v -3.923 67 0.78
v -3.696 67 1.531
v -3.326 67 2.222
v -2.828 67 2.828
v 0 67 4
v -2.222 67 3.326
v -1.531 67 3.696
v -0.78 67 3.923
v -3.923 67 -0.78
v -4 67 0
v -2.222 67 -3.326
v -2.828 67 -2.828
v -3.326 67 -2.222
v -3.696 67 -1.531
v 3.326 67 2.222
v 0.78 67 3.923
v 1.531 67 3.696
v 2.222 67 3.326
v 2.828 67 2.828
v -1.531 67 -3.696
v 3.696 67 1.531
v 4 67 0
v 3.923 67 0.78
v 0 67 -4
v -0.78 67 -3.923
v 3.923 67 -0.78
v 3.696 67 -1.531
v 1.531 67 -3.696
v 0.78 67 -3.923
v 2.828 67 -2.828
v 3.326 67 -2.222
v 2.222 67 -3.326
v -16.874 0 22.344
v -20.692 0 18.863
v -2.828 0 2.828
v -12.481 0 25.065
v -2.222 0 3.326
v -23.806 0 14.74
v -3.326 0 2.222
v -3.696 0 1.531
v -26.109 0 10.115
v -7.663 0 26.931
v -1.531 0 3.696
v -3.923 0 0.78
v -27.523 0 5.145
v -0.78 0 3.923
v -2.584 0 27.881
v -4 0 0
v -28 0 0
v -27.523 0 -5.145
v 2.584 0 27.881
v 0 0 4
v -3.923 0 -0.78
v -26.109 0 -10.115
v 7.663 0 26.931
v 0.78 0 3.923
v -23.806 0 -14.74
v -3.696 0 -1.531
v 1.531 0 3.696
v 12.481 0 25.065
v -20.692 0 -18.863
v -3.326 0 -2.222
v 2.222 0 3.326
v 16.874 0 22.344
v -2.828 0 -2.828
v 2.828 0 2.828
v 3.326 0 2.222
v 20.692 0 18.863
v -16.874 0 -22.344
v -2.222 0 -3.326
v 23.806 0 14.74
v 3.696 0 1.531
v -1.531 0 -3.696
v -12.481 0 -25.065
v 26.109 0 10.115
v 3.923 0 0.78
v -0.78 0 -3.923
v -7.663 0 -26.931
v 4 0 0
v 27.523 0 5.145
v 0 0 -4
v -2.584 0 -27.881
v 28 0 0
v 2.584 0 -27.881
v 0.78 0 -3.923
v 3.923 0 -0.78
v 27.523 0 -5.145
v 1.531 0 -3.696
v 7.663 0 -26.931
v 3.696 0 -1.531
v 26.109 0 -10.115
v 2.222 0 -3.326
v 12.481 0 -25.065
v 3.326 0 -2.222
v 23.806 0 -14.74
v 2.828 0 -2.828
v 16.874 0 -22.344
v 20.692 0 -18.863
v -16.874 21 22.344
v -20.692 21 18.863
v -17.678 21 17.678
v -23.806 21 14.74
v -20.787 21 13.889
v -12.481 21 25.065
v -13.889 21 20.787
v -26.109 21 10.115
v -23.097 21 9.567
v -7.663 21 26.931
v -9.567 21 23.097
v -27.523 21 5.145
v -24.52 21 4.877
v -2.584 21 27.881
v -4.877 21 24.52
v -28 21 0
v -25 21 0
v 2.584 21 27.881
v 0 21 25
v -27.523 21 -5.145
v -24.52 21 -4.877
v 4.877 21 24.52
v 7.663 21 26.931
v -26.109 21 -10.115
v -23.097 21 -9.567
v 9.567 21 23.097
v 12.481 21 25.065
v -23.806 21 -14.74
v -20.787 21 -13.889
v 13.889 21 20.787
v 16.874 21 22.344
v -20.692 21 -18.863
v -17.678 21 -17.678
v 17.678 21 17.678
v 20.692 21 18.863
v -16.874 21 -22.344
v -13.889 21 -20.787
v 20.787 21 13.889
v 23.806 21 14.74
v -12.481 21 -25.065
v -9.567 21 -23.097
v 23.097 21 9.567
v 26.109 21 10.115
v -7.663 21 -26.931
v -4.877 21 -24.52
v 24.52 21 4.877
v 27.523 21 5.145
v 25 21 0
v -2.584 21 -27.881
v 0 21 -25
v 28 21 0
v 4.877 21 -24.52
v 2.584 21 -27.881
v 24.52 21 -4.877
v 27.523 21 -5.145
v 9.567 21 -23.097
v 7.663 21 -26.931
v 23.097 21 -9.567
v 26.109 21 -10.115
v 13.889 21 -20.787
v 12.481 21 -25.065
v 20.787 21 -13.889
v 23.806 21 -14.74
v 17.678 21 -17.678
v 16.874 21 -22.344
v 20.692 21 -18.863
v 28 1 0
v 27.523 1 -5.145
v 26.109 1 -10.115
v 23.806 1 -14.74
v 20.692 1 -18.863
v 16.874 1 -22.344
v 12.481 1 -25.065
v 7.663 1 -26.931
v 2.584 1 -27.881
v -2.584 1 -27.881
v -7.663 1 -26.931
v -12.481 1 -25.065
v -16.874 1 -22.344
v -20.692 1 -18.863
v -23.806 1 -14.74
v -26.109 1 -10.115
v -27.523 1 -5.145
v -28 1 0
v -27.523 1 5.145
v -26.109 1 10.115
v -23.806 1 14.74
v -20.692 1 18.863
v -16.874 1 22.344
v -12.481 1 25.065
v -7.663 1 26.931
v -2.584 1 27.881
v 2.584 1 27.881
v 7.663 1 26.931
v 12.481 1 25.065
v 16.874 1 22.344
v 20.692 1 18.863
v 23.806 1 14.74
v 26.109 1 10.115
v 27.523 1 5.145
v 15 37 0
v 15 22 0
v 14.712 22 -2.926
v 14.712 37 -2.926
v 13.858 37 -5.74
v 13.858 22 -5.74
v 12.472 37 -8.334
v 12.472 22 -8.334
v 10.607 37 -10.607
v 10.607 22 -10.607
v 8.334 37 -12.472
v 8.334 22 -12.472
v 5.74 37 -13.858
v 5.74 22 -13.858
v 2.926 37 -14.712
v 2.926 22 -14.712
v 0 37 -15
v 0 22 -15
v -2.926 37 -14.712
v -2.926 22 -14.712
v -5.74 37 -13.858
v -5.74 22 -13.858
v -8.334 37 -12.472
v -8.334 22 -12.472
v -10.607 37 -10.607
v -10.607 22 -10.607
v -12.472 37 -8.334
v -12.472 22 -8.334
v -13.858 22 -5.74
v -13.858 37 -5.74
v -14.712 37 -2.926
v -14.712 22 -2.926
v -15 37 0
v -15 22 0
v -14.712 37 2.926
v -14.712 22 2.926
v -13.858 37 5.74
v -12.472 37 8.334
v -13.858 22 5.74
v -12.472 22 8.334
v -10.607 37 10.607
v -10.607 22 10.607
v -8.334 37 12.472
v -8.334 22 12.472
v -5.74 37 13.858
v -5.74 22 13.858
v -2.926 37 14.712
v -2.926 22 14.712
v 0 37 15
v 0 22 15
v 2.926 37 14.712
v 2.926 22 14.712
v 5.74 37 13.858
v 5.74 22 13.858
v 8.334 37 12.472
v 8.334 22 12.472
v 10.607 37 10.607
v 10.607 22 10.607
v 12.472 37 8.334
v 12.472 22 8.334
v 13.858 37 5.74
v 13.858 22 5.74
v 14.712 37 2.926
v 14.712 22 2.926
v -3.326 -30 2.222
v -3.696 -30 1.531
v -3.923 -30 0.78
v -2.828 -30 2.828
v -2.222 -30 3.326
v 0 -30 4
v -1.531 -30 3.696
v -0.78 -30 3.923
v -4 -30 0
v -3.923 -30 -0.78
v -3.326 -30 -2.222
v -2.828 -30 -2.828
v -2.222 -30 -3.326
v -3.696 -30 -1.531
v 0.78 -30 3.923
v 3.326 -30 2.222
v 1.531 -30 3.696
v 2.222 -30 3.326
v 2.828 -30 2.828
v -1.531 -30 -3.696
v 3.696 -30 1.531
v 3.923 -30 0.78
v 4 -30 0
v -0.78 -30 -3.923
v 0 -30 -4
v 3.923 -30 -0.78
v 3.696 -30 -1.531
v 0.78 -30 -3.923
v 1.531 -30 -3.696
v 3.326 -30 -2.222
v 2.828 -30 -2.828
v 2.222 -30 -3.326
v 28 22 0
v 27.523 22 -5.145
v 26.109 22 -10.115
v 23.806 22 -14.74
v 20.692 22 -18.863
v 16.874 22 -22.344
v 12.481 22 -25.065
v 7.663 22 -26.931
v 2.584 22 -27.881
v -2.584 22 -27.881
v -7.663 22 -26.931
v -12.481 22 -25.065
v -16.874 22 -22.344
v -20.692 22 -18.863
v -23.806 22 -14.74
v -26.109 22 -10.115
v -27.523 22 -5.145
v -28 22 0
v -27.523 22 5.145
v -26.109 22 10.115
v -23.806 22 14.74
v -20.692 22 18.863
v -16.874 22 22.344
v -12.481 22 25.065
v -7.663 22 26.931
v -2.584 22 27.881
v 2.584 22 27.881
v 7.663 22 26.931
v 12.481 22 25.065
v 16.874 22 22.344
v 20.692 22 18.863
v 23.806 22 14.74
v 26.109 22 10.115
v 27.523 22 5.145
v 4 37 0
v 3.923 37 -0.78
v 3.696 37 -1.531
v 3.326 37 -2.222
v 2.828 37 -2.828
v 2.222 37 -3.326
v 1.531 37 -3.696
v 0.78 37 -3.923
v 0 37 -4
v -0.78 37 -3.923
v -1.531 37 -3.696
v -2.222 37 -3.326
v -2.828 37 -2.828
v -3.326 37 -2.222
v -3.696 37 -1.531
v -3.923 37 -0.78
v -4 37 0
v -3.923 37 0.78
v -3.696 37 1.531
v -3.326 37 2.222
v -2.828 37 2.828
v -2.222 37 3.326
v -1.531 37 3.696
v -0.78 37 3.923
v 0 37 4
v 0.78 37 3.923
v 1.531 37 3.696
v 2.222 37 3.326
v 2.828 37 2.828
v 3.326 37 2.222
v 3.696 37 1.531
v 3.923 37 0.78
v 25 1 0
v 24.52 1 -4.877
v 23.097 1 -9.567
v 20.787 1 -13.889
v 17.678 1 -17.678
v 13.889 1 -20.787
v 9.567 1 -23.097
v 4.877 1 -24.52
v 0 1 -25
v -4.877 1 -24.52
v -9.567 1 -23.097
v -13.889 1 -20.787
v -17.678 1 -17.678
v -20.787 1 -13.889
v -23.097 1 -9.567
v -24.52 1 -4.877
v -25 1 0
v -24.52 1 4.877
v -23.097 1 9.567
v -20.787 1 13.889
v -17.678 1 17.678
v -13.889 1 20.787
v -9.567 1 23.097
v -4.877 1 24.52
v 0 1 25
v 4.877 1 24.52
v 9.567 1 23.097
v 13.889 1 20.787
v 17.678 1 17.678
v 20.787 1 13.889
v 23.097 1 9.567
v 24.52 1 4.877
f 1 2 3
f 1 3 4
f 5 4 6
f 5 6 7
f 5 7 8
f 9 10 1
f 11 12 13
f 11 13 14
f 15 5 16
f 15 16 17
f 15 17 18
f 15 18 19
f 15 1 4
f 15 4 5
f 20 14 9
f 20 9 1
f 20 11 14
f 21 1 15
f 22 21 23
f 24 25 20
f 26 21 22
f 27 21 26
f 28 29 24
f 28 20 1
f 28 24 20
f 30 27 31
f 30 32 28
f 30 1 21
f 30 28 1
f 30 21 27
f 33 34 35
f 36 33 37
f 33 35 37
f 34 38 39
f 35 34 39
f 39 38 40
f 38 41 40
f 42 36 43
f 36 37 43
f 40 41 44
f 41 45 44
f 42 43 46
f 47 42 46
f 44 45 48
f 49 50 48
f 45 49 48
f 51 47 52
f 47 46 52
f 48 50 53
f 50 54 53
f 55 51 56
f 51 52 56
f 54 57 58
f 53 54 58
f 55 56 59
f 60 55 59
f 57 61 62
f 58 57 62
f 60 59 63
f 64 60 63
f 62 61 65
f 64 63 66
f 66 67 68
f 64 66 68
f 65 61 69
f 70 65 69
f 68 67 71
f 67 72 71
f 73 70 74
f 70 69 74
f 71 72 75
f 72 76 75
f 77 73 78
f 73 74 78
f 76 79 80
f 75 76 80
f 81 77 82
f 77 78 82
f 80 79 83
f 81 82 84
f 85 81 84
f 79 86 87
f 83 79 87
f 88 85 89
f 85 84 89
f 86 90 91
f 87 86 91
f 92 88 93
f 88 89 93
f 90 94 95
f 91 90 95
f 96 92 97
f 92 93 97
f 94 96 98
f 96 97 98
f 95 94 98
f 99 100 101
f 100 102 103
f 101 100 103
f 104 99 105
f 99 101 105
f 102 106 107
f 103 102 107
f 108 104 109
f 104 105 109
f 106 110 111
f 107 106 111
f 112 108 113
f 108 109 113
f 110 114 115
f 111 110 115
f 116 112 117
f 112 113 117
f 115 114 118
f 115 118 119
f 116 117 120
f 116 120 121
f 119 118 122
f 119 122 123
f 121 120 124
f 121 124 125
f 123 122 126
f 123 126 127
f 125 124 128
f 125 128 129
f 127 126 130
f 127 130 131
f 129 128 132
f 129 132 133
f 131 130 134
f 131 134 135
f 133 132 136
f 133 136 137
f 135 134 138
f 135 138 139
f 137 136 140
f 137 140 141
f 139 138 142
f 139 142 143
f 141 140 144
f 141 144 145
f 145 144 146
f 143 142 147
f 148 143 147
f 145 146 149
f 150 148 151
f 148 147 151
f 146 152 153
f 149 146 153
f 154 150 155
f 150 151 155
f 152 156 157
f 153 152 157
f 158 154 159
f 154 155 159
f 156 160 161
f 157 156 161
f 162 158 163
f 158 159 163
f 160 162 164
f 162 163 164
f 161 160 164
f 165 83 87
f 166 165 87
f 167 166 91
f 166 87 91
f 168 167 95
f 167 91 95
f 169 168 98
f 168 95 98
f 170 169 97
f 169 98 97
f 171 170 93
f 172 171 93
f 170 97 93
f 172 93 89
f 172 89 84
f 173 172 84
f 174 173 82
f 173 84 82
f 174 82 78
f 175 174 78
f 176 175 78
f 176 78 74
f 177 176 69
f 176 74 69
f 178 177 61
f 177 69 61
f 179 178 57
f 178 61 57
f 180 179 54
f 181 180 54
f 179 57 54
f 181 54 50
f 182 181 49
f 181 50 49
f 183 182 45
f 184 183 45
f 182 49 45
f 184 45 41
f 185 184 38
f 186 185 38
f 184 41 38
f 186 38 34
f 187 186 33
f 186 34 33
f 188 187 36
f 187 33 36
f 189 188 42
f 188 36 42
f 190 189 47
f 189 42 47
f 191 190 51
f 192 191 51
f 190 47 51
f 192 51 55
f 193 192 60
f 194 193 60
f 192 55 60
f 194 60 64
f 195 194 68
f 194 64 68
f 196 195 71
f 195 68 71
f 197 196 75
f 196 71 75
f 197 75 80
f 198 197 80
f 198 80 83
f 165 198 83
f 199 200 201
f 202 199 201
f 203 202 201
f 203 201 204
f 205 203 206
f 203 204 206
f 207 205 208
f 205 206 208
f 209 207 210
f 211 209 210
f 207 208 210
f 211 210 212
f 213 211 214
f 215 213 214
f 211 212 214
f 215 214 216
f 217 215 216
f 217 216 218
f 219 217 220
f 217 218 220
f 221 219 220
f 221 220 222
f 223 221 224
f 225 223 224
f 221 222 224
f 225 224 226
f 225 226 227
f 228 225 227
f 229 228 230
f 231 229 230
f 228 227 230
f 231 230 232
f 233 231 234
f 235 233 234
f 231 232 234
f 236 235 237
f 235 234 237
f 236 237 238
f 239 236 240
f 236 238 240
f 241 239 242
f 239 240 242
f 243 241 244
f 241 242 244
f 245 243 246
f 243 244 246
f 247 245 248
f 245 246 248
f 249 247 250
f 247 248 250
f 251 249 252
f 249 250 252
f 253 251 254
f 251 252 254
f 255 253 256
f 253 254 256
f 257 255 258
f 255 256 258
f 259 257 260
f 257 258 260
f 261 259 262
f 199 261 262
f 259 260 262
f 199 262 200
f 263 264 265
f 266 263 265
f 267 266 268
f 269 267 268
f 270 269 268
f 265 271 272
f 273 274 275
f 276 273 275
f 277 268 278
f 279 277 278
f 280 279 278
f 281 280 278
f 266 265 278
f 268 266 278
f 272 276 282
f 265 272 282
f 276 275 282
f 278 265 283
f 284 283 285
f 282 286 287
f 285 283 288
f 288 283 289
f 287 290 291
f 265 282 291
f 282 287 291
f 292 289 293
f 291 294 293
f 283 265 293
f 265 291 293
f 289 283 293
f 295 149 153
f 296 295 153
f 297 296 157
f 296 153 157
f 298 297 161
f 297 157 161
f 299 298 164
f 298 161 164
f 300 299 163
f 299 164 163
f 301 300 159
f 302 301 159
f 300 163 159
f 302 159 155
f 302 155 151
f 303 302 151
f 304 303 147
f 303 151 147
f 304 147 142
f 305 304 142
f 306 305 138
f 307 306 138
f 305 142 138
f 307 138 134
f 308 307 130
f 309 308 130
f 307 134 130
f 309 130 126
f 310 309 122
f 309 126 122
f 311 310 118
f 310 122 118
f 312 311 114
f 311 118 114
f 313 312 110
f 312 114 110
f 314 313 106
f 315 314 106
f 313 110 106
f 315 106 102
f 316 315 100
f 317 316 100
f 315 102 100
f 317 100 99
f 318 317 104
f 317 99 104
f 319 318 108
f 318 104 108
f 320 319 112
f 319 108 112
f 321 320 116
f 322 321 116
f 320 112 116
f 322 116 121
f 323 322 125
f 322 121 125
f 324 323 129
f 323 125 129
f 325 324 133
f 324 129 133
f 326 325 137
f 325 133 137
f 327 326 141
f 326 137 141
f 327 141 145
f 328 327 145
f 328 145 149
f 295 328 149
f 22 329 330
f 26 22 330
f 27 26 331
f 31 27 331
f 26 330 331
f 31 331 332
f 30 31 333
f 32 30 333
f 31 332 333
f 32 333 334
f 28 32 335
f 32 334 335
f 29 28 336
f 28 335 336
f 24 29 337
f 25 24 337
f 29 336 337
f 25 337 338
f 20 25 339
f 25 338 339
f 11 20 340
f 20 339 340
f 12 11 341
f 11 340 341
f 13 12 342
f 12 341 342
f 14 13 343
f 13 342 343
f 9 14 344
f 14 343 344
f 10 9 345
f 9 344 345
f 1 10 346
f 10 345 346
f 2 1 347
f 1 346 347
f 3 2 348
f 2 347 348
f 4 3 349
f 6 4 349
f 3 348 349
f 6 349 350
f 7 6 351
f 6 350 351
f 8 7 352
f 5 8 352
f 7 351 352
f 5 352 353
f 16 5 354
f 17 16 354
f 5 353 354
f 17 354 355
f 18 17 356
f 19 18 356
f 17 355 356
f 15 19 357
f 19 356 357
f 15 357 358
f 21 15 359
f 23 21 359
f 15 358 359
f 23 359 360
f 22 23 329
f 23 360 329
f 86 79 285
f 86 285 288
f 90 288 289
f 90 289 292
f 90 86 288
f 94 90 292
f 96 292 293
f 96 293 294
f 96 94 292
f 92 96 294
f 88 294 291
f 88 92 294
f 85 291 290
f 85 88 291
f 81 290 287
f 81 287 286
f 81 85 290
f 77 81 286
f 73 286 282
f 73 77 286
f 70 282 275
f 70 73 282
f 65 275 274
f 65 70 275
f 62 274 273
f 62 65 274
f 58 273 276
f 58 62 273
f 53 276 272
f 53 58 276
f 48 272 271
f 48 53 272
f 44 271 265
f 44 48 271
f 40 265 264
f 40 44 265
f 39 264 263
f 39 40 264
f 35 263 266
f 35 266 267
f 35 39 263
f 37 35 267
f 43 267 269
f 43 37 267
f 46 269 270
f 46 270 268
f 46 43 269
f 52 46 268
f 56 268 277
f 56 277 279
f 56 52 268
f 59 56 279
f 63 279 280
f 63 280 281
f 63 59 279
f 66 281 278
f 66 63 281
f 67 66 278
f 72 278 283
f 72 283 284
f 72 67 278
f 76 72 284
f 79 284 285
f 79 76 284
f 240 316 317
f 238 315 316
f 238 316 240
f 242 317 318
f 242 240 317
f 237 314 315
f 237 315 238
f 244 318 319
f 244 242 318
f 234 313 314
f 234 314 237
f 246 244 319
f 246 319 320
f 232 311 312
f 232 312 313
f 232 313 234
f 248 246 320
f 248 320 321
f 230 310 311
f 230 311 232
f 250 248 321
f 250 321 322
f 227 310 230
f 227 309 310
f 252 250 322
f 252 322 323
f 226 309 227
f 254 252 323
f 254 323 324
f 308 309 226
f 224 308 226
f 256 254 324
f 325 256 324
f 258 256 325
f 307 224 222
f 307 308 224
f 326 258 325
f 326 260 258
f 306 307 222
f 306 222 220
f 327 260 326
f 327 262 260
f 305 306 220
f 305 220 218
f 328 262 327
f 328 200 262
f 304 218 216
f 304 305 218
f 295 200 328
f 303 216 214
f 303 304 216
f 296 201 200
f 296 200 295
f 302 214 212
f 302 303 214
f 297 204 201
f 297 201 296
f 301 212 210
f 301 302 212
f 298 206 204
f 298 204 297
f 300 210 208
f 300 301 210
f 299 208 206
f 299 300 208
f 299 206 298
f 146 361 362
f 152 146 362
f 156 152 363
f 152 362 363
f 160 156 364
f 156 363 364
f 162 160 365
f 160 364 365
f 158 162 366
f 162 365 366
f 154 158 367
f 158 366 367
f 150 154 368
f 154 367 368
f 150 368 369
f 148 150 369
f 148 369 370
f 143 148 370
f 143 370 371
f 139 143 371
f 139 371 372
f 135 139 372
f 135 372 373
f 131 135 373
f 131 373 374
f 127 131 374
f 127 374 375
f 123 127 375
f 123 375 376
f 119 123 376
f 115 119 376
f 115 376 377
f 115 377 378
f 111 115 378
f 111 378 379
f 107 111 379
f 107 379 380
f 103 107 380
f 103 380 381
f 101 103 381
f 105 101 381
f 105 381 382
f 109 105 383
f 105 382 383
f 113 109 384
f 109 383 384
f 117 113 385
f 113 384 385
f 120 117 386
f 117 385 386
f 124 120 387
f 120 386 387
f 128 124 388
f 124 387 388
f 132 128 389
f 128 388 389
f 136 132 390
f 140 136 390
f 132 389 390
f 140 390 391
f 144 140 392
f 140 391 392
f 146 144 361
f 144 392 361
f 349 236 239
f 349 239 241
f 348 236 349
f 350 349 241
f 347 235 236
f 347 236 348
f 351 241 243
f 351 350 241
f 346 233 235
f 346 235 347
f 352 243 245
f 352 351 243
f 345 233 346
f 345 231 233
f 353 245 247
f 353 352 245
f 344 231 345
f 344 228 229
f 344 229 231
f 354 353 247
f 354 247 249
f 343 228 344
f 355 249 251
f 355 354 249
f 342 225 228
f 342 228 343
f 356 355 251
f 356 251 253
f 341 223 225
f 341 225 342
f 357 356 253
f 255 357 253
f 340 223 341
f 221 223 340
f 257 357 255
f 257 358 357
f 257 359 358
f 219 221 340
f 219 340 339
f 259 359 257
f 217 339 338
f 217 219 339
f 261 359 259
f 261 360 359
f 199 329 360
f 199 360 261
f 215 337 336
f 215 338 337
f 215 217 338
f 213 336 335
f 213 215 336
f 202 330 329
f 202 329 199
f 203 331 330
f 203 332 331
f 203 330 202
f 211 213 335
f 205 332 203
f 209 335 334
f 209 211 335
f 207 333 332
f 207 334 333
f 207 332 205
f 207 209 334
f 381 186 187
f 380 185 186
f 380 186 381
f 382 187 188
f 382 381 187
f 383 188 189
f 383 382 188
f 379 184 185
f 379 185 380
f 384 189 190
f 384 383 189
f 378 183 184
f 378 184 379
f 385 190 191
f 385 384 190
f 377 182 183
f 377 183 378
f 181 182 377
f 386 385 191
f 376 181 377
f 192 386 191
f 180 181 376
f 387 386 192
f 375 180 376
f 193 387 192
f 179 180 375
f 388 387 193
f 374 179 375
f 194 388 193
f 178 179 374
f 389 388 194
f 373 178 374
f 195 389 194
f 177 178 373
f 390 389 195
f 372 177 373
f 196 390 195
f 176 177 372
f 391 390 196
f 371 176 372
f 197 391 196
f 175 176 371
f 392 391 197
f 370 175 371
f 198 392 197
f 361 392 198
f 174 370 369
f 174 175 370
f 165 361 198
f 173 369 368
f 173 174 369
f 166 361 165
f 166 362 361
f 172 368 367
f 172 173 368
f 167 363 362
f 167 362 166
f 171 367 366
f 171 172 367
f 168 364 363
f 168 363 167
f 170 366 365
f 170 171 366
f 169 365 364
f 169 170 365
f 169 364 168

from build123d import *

# Parameters (mm, degrees)
SKETCH1_R           = 25
BOSS_EXTRUDE1_DEPTH = 21
SKETCH2_R           = 28
BOSS_EXTRUDE2_DEPTH = 1
SKETCH3_R           = 28
BOSS_EXTRUDE3_DEPTH = 1
SKETCH4_R           = 15
BOSS_EXTRUDE4_DEPTH = 15
SKETCH5_R           = 4
BOSS_EXTRUDE5_DEPTH = 30
SKETCH6_R           = 4
BOSS_EXTRUDE6_DEPTH = 30


with BuildPart() as part:
    # Sketch1 → Boss-Extrude1 (new body)
    with BuildSketch(Plane(origin=(0, 0, 0), x_dir=(1, 0, 0), z_dir=(0, 1, 0))):
        Circle(SKETCH1_R)
    extrude(amount=BOSS_EXTRUDE1_DEPTH)

    # Sketch2 → Boss-Extrude2 (add)
    with BuildSketch(Plane(origin=(0, 0, 0), x_dir=(1, 0, 0), z_dir=(0, 1, 0))):
        Circle(SKETCH2_R)
    extrude(amount=BOSS_EXTRUDE2_DEPTH)

    # Sketch3 → Boss-Extrude3 (add)
    with BuildSketch(Plane(origin=(0, 21, 0), x_dir=(1, 0, 0), z_dir=(0, 1, 0))):
        Circle(SKETCH3_R)
    extrude(amount=BOSS_EXTRUDE3_DEPTH)

    # Sketch4 → Boss-Extrude4 (add)
    with BuildSketch(Plane(origin=(0, 22, 0), x_dir=(1, 0, 0), z_dir=(0, 1, 0))):
        Circle(SKETCH4_R)
    extrude(amount=BOSS_EXTRUDE4_DEPTH)

    # Sketch5 → Boss-Extrude5 (add)
    with BuildSketch(Plane(origin=(0, 37, 0), x_dir=(1, 0, 0), z_dir=(0, 1, 0))):
        Circle(SKETCH5_R)
    extrude(amount=BOSS_EXTRUDE5_DEPTH)

    # Sketch6 → Boss-Extrude6 (add)
    with BuildSketch(Plane(origin=(0, 0, 0), x_dir=(1, 0, 0), z_dir=(0, 1, 0))):
        Circle(SKETCH6_R)
    extrude(amount=-BOSS_EXTRUDE6_DEPTH)


solid = part.part
